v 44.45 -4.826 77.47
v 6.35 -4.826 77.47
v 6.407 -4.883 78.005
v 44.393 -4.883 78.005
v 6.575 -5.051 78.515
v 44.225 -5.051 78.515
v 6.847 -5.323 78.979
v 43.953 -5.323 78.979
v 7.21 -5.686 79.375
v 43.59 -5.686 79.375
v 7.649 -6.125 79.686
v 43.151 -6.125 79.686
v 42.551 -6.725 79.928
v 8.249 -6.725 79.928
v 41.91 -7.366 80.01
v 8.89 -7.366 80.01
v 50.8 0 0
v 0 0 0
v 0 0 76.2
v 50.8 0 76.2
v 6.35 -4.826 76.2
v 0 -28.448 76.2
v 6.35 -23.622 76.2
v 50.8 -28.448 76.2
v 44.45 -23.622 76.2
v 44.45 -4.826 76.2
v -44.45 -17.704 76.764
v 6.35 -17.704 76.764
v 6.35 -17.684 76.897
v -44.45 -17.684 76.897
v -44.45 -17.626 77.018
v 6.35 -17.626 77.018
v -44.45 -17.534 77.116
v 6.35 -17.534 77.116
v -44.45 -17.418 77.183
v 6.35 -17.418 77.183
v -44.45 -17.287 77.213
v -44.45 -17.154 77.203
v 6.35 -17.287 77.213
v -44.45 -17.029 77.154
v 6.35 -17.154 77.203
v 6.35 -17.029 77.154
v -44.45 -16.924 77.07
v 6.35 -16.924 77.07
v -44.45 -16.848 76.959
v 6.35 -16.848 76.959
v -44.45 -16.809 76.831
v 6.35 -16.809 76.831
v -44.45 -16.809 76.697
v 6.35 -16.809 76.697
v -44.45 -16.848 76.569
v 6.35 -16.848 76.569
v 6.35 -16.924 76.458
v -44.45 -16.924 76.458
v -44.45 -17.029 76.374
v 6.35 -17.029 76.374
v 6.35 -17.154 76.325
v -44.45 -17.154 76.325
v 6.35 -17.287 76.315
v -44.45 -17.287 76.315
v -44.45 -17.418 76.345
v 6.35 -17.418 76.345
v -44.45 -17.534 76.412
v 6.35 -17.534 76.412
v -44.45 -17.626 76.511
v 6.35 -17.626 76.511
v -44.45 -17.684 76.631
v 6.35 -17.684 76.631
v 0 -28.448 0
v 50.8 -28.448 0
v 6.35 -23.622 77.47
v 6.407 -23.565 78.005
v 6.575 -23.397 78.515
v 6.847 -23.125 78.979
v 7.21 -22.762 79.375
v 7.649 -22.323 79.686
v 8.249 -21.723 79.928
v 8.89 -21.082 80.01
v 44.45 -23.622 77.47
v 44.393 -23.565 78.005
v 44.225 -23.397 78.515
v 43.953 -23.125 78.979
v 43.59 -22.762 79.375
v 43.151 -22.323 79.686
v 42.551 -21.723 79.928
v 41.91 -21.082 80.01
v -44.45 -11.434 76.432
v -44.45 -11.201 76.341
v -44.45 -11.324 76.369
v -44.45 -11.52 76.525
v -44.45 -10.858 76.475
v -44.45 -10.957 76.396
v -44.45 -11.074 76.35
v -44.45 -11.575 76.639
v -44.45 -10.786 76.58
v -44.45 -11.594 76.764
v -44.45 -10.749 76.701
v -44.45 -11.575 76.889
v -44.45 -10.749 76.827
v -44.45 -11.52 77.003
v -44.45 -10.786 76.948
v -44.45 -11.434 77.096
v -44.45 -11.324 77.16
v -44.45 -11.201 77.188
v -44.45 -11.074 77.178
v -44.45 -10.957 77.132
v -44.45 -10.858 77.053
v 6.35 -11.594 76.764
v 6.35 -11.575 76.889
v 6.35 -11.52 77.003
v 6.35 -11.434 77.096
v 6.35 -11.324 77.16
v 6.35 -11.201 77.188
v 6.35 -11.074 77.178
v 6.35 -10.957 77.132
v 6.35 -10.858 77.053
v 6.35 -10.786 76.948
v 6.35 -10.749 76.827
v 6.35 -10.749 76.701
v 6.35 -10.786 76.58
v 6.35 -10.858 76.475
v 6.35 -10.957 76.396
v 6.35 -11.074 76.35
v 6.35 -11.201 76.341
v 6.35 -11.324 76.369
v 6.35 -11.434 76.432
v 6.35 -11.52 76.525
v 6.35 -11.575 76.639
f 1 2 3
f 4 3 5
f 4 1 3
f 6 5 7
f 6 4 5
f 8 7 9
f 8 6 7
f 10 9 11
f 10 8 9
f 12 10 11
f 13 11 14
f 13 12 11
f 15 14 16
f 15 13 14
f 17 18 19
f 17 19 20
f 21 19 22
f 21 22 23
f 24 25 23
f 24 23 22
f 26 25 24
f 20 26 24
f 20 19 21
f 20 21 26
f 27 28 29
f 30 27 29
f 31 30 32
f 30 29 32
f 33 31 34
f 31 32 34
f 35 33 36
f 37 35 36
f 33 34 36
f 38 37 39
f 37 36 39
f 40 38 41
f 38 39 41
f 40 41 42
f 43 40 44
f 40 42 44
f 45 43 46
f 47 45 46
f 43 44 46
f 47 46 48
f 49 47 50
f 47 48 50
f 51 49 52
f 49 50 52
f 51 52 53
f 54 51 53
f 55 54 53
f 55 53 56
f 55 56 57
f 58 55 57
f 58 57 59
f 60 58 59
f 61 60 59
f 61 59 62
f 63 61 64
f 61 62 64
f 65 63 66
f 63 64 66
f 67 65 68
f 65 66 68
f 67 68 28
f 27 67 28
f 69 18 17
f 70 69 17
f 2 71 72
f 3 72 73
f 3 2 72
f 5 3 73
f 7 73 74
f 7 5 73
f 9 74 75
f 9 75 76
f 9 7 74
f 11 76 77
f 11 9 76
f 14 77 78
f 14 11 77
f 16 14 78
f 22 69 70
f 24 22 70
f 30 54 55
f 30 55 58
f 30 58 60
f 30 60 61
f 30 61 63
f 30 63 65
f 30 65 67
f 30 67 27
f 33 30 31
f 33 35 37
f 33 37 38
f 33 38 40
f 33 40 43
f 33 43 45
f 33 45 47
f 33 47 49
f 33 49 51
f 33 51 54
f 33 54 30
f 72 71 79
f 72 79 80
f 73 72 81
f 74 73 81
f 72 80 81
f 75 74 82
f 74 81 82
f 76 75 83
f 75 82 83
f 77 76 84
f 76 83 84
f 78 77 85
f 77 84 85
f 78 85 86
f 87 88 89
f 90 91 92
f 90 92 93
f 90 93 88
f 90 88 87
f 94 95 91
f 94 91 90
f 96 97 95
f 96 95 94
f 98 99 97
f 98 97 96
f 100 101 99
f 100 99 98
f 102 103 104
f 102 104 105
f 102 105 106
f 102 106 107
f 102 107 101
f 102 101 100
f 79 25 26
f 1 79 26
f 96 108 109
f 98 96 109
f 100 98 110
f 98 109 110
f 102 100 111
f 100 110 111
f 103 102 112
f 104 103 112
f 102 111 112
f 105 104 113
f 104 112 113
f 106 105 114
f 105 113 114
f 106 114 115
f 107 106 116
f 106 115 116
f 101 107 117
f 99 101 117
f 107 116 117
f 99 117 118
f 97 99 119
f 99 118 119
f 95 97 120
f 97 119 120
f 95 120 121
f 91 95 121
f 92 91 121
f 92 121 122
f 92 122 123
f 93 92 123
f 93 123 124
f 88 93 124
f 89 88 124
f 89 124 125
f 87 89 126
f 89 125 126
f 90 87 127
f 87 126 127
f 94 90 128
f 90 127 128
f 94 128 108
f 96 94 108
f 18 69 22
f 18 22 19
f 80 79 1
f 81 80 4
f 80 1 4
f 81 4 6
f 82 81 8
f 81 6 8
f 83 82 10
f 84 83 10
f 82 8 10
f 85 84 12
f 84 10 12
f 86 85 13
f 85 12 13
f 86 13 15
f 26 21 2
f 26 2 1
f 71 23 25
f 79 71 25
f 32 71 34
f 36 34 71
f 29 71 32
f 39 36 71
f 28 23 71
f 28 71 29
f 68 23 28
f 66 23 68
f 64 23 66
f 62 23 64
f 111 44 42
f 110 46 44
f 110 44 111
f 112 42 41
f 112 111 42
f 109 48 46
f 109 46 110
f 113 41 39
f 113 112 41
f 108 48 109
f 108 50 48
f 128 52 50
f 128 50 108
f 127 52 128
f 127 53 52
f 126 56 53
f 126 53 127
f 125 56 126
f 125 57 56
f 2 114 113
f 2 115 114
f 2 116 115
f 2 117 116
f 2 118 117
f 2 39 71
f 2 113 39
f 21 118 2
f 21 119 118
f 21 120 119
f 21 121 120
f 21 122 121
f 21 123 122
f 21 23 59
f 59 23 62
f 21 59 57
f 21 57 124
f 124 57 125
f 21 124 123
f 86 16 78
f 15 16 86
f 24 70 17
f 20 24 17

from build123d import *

# Parameters (mm, degrees)
F0_W     = 50.8
F0_H     = 28.448
F1_DEPTH = 76.2
F2_W     = 38.1
F2_H     = 18.796
F3_DEPTH = 3.81
F4_R     = 2.54
F5_R     = 0.424779
F5_R_2   = 0.450135
F6_DEPTH = 50.8


with BuildPart() as f1:
    # F0 (on Top) → F1 (new body)
    with BuildSketch(Plane.XY):
        with Locations((25.4, -14.224)):
            Rectangle(F0_W, F0_H)
    extrude(amount=F1_DEPTH)

    # F2 (on face) → F3 (join)
    with BuildSketch(Plane.XY.offset(76.2)):
        with Locations((25.4, -14.224)):
            Rectangle(F2_W, F2_H)
    extrude(amount=F3_DEPTH)

    # F4
    f4_edges = [f1.edges().sort_by_distance(p)[0] for p in [
        (25.4, -4.826, 80.01),
        (25.4, -23.622, 80.01),
        (6.35, -14.224, 80.01),
        (44.45, -14.224, 80.01),
    ]]
    fillet(f4_edges, radius=F4_R)

    # F5 (on face) → F6 (join)
    with BuildSketch(Plane(origin=(6.35, 0, 0), x_dir=(0, -1, 0), z_dir=(-1, 0, 0))):
        with Locations((11.168979, 76.764129)):
            Circle(F5_R)
        with Locations((17.253665, 76.764129)):
            Circle(F5_R_2)
    extrude(amount=F6_DEPTH)


solid = f1.part
